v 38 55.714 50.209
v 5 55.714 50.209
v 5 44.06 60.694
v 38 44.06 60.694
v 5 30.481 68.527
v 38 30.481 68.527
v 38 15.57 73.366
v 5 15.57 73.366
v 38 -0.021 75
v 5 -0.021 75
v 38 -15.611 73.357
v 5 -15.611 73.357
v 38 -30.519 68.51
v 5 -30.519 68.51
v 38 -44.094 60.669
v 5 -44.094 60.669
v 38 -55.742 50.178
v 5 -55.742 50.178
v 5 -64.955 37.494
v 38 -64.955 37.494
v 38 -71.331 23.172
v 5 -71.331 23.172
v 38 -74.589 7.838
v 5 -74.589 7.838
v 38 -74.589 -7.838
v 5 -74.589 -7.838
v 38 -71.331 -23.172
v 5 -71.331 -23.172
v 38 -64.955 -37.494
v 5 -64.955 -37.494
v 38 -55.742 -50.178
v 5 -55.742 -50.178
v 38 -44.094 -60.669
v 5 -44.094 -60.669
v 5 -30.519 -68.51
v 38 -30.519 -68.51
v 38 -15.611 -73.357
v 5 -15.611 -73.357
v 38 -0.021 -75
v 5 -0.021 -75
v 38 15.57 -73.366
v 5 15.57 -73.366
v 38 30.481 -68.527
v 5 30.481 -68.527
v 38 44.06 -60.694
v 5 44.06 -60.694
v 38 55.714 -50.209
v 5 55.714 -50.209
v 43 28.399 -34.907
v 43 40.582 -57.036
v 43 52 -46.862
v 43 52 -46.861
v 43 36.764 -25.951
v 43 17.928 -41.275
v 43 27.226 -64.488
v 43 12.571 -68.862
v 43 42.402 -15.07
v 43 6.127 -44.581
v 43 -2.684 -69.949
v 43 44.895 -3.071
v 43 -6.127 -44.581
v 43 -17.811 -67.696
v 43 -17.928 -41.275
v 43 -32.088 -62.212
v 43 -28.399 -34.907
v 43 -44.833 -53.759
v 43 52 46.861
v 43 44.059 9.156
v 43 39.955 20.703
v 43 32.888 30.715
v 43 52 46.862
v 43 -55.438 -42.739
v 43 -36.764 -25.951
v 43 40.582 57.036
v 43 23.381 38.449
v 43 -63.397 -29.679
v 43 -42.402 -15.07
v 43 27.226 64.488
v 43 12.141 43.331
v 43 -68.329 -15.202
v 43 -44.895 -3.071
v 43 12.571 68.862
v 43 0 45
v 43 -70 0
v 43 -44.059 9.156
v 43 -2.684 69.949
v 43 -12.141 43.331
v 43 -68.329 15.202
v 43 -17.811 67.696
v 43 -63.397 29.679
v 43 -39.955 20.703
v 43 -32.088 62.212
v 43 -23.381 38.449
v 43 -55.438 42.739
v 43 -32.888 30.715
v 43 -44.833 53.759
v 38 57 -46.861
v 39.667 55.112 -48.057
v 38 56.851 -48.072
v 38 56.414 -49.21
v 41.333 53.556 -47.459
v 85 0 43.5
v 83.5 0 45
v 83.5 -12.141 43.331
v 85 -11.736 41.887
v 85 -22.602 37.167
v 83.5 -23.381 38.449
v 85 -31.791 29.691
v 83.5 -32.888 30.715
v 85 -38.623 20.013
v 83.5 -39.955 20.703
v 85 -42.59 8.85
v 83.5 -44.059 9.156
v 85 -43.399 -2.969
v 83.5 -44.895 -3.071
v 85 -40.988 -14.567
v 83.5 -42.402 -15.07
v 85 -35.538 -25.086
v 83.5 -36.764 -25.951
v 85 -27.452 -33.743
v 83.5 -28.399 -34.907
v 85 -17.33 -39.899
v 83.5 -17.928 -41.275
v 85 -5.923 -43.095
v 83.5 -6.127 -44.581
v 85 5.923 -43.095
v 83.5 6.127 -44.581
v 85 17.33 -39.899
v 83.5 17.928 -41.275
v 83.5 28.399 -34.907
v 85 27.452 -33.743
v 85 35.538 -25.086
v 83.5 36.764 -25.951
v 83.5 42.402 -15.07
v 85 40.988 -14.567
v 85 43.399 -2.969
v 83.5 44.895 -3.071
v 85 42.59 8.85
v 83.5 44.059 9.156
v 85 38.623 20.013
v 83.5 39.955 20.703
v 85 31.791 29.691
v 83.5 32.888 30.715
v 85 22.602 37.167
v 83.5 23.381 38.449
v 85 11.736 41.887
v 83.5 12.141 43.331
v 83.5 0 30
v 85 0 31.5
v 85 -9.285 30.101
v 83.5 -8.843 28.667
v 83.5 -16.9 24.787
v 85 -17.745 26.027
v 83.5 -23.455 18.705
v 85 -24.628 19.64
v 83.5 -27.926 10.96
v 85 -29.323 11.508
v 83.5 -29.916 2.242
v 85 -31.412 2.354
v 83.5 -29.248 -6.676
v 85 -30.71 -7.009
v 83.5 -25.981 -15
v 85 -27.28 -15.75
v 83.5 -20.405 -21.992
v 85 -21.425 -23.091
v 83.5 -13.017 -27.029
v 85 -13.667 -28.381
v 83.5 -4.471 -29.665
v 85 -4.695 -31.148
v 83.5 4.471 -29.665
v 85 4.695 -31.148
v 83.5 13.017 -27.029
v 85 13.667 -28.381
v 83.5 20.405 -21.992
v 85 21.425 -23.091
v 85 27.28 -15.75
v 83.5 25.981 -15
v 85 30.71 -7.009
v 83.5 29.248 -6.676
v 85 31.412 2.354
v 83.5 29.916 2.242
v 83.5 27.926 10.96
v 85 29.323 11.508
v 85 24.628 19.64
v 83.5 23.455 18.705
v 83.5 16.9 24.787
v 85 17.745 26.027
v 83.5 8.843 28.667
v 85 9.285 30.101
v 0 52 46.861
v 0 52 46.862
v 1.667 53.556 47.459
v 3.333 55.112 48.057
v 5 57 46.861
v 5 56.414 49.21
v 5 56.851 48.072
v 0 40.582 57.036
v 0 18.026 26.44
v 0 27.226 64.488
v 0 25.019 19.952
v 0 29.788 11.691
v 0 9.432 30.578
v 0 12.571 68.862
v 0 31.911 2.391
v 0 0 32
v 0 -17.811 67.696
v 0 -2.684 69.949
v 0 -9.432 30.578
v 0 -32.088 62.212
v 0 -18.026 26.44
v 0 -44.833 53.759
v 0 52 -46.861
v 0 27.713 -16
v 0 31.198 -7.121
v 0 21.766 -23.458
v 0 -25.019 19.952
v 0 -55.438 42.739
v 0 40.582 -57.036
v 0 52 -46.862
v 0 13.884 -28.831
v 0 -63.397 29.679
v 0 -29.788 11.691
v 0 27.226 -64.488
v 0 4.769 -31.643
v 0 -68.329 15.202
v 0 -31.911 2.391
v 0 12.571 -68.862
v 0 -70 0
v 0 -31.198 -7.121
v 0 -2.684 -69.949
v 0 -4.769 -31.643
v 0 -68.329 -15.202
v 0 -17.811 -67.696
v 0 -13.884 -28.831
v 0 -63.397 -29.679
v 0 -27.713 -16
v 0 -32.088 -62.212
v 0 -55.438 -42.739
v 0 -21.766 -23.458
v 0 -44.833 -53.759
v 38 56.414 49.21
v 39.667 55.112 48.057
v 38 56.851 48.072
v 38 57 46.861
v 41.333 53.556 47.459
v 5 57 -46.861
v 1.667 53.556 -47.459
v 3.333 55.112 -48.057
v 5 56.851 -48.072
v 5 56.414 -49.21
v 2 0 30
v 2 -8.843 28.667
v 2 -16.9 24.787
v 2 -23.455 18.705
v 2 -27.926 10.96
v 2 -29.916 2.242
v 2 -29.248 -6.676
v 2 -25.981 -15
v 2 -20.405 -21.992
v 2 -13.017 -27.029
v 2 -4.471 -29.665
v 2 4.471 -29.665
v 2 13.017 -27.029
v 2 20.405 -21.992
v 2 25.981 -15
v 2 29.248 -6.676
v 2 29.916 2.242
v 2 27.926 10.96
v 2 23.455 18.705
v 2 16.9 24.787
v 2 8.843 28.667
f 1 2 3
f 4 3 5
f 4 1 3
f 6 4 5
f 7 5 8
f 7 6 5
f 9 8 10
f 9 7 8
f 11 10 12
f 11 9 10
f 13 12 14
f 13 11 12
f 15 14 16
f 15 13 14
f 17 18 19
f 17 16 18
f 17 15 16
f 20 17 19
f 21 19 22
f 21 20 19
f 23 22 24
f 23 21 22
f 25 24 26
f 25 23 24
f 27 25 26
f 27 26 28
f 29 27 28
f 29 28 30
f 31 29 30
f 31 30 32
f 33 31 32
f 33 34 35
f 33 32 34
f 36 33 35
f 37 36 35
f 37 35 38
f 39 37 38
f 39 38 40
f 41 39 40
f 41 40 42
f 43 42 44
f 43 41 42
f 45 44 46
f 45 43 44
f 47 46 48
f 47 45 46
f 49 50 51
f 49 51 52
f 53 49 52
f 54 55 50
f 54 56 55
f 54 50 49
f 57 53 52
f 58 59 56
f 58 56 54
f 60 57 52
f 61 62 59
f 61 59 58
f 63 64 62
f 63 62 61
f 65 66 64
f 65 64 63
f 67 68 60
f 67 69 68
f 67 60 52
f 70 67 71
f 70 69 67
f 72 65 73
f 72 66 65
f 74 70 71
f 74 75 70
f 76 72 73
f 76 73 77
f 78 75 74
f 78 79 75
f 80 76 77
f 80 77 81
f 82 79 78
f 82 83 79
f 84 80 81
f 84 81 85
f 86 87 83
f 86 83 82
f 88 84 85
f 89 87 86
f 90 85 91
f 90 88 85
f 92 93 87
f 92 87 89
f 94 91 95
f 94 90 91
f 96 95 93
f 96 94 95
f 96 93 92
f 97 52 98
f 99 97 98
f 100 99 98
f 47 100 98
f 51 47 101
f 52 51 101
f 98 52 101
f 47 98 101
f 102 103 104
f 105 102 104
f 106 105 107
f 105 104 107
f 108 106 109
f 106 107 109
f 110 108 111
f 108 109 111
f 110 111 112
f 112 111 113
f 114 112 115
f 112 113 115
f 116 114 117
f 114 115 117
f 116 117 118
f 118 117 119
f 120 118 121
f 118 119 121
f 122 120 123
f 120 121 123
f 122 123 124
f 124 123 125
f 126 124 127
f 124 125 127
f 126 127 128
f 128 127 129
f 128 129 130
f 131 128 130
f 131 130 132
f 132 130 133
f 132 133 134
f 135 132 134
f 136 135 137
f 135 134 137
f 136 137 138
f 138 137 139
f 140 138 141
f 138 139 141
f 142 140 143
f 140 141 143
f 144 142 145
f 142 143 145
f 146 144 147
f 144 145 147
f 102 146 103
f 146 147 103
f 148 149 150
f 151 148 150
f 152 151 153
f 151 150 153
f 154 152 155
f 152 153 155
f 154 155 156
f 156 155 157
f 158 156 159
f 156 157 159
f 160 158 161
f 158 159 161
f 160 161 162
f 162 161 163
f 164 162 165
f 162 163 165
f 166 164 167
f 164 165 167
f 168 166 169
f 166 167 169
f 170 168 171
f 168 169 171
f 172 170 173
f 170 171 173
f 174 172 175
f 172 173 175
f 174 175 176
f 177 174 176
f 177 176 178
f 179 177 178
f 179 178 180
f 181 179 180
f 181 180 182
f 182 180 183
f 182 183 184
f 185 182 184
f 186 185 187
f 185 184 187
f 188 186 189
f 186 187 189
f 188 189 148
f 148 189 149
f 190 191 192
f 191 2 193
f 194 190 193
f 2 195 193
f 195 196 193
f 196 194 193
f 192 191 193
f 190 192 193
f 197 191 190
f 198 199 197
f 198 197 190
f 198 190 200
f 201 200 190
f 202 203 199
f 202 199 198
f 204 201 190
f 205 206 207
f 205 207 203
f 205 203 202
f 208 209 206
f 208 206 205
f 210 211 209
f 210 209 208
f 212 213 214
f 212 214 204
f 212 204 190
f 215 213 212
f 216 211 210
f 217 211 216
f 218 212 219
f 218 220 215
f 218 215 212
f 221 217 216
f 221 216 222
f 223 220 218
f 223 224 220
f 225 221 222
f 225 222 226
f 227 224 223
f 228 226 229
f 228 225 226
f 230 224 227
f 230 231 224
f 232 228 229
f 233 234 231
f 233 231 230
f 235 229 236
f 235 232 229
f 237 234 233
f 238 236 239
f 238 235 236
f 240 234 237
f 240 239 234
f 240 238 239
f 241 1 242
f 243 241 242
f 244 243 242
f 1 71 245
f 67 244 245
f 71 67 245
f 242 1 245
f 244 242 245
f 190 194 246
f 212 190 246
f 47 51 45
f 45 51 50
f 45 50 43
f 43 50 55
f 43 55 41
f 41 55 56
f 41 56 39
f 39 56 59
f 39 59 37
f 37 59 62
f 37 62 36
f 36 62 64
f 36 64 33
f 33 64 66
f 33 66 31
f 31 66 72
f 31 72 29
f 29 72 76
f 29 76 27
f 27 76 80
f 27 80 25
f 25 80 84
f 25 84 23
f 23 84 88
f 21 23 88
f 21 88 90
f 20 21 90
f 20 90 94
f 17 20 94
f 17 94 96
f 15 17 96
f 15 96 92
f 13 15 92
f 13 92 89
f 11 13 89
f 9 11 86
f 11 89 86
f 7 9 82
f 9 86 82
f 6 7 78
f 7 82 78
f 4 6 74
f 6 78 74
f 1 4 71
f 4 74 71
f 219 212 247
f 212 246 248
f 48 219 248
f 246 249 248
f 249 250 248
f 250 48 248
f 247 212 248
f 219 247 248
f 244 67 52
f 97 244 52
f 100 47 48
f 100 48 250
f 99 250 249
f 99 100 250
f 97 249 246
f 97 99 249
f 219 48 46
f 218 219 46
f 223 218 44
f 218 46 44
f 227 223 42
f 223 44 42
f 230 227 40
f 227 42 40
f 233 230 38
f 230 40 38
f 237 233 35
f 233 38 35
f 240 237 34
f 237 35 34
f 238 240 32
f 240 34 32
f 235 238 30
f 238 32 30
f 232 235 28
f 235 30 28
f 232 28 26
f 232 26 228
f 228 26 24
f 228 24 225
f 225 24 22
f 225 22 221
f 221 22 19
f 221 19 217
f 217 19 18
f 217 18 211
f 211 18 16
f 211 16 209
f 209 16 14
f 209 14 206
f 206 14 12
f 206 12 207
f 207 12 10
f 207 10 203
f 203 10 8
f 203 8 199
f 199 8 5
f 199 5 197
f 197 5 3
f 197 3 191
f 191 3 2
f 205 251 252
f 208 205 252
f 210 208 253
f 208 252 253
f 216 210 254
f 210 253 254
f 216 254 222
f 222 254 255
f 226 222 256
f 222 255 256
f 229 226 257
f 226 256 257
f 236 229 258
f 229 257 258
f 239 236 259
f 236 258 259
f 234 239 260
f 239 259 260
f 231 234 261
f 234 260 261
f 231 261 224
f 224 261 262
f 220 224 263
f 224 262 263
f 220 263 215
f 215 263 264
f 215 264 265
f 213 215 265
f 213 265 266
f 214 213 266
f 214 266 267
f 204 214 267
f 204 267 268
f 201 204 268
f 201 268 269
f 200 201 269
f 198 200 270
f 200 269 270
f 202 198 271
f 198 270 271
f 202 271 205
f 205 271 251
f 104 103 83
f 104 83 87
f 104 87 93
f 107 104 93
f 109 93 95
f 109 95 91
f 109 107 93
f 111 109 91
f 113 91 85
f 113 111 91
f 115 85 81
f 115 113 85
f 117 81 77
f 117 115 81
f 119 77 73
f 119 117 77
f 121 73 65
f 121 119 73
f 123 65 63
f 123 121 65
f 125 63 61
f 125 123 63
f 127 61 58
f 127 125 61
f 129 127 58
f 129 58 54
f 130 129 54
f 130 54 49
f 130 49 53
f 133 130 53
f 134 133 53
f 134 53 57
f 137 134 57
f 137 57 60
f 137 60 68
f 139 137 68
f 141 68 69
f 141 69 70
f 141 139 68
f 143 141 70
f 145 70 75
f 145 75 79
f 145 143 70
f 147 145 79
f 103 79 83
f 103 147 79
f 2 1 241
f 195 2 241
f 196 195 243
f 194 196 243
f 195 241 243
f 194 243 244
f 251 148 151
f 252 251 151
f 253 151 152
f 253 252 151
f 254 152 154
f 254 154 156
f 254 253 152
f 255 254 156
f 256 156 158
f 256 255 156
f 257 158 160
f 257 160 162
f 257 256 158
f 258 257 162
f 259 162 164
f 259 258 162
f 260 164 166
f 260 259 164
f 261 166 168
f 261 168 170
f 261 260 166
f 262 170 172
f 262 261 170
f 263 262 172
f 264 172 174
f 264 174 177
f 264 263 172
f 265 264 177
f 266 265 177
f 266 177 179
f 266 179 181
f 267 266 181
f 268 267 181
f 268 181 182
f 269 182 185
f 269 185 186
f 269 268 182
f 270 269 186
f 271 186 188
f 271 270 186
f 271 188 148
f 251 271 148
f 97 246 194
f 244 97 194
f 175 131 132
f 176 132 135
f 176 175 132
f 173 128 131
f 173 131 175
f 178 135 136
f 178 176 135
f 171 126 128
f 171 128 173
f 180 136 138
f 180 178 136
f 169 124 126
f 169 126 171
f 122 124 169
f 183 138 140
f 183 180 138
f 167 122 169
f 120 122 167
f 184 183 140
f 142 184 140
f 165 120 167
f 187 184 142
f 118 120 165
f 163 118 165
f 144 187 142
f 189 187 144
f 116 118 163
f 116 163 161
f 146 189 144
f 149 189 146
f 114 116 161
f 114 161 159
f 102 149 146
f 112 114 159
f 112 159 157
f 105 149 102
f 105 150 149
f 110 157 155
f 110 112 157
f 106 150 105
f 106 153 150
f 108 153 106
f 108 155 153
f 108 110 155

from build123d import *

# Parameters (mm, degrees)
CUT_EXTRUDE_1_REACH = 137.923
CHAMFER_2_SIZE      = 1.5
FILLET_1_R          = 5
CHAMFER_3_SIZE      = 5
CHAMFER_4_SIZE      = 2


with BuildPart() as part:
    # 草图1 → 旋转1 (revolve)
    with BuildSketch(Plane.XY, mode=Mode.PRIVATE) as revolve_1_sk:
        Polygon((0, 30), (0, 75), (43, 75), (43, 45), (85, 45), (85, 30), align=None)
    revolve(revolve_1_sk.sketch.rotate(Axis((0, 0, 0), (1, 0, 0)), 90), axis=Axis((0, 0, 0), (1, 0, 0)))

    # 草图3 → 切除-拉伸1 (cut, up to next)
    with BuildSketch(Plane.ZY, mode=Mode.PRIVATE) as cut_extrude_1_sk1:
        with BuildLine():
            Line((-48.744230428, 57), (48.744230428, 57))
            ThreePointArc((48.744230428, 57), (0, 75), (-48.744230428, 57))
        make_face()
    cut_extrude_1_tool1 = extrude(cut_extrude_1_sk1.sketch, amount=-CUT_EXTRUDE_1_REACH, mode=Mode.PRIVATE) & part.part
    add(cut_extrude_1_tool1.solids().sort_by_distance((0, 64.279608, 0))[0], mode=Mode.SUBTRACT)

    # 倒角2
    chamfer_2_edges = [part.edges().sort_by_distance(p)[0] for p in [
        (85, 0, -30),
        (85, 0, -45),
    ]]
    chamfer(chamfer_2_edges, length=CHAMFER_2_SIZE)

    # 圆角1
    fillet_1_edges = [part.edges().sort_by_distance(p)[0] for p in [
        (21.5, 57, -48.744230428),
        (21.5, 57, 48.744230428),
    ]]
    fillet(fillet_1_edges, radius=FILLET_1_R)

    # 倒角3
    chamfer_3_edges = [part.edges().sort_by_distance(p)[0] for p in [
        (43, -75, 0),
        (0, -75, 0),
        (0, 57, 0),
        (0, 56.667516929, -48.654340969),
        (0, 56.667516929, 48.654340969),
        (43, 57, 0),
        (43, 56.667516929, -48.654340969),
        (43, 56.667516929, 48.654340969),
    ]]
    chamfer(chamfer_3_edges, length=CHAMFER_3_SIZE - 0.0001)  # a hair under: the kernel refuses the full size

    # 倒角4
    chamfer_4_edges = [part.edges().sort_by_distance(p)[0] for p in [
        (0, 0, -30),
    ]]
    chamfer(chamfer_4_edges, length=CHAMFER_4_SIZE)


solid = part.part
